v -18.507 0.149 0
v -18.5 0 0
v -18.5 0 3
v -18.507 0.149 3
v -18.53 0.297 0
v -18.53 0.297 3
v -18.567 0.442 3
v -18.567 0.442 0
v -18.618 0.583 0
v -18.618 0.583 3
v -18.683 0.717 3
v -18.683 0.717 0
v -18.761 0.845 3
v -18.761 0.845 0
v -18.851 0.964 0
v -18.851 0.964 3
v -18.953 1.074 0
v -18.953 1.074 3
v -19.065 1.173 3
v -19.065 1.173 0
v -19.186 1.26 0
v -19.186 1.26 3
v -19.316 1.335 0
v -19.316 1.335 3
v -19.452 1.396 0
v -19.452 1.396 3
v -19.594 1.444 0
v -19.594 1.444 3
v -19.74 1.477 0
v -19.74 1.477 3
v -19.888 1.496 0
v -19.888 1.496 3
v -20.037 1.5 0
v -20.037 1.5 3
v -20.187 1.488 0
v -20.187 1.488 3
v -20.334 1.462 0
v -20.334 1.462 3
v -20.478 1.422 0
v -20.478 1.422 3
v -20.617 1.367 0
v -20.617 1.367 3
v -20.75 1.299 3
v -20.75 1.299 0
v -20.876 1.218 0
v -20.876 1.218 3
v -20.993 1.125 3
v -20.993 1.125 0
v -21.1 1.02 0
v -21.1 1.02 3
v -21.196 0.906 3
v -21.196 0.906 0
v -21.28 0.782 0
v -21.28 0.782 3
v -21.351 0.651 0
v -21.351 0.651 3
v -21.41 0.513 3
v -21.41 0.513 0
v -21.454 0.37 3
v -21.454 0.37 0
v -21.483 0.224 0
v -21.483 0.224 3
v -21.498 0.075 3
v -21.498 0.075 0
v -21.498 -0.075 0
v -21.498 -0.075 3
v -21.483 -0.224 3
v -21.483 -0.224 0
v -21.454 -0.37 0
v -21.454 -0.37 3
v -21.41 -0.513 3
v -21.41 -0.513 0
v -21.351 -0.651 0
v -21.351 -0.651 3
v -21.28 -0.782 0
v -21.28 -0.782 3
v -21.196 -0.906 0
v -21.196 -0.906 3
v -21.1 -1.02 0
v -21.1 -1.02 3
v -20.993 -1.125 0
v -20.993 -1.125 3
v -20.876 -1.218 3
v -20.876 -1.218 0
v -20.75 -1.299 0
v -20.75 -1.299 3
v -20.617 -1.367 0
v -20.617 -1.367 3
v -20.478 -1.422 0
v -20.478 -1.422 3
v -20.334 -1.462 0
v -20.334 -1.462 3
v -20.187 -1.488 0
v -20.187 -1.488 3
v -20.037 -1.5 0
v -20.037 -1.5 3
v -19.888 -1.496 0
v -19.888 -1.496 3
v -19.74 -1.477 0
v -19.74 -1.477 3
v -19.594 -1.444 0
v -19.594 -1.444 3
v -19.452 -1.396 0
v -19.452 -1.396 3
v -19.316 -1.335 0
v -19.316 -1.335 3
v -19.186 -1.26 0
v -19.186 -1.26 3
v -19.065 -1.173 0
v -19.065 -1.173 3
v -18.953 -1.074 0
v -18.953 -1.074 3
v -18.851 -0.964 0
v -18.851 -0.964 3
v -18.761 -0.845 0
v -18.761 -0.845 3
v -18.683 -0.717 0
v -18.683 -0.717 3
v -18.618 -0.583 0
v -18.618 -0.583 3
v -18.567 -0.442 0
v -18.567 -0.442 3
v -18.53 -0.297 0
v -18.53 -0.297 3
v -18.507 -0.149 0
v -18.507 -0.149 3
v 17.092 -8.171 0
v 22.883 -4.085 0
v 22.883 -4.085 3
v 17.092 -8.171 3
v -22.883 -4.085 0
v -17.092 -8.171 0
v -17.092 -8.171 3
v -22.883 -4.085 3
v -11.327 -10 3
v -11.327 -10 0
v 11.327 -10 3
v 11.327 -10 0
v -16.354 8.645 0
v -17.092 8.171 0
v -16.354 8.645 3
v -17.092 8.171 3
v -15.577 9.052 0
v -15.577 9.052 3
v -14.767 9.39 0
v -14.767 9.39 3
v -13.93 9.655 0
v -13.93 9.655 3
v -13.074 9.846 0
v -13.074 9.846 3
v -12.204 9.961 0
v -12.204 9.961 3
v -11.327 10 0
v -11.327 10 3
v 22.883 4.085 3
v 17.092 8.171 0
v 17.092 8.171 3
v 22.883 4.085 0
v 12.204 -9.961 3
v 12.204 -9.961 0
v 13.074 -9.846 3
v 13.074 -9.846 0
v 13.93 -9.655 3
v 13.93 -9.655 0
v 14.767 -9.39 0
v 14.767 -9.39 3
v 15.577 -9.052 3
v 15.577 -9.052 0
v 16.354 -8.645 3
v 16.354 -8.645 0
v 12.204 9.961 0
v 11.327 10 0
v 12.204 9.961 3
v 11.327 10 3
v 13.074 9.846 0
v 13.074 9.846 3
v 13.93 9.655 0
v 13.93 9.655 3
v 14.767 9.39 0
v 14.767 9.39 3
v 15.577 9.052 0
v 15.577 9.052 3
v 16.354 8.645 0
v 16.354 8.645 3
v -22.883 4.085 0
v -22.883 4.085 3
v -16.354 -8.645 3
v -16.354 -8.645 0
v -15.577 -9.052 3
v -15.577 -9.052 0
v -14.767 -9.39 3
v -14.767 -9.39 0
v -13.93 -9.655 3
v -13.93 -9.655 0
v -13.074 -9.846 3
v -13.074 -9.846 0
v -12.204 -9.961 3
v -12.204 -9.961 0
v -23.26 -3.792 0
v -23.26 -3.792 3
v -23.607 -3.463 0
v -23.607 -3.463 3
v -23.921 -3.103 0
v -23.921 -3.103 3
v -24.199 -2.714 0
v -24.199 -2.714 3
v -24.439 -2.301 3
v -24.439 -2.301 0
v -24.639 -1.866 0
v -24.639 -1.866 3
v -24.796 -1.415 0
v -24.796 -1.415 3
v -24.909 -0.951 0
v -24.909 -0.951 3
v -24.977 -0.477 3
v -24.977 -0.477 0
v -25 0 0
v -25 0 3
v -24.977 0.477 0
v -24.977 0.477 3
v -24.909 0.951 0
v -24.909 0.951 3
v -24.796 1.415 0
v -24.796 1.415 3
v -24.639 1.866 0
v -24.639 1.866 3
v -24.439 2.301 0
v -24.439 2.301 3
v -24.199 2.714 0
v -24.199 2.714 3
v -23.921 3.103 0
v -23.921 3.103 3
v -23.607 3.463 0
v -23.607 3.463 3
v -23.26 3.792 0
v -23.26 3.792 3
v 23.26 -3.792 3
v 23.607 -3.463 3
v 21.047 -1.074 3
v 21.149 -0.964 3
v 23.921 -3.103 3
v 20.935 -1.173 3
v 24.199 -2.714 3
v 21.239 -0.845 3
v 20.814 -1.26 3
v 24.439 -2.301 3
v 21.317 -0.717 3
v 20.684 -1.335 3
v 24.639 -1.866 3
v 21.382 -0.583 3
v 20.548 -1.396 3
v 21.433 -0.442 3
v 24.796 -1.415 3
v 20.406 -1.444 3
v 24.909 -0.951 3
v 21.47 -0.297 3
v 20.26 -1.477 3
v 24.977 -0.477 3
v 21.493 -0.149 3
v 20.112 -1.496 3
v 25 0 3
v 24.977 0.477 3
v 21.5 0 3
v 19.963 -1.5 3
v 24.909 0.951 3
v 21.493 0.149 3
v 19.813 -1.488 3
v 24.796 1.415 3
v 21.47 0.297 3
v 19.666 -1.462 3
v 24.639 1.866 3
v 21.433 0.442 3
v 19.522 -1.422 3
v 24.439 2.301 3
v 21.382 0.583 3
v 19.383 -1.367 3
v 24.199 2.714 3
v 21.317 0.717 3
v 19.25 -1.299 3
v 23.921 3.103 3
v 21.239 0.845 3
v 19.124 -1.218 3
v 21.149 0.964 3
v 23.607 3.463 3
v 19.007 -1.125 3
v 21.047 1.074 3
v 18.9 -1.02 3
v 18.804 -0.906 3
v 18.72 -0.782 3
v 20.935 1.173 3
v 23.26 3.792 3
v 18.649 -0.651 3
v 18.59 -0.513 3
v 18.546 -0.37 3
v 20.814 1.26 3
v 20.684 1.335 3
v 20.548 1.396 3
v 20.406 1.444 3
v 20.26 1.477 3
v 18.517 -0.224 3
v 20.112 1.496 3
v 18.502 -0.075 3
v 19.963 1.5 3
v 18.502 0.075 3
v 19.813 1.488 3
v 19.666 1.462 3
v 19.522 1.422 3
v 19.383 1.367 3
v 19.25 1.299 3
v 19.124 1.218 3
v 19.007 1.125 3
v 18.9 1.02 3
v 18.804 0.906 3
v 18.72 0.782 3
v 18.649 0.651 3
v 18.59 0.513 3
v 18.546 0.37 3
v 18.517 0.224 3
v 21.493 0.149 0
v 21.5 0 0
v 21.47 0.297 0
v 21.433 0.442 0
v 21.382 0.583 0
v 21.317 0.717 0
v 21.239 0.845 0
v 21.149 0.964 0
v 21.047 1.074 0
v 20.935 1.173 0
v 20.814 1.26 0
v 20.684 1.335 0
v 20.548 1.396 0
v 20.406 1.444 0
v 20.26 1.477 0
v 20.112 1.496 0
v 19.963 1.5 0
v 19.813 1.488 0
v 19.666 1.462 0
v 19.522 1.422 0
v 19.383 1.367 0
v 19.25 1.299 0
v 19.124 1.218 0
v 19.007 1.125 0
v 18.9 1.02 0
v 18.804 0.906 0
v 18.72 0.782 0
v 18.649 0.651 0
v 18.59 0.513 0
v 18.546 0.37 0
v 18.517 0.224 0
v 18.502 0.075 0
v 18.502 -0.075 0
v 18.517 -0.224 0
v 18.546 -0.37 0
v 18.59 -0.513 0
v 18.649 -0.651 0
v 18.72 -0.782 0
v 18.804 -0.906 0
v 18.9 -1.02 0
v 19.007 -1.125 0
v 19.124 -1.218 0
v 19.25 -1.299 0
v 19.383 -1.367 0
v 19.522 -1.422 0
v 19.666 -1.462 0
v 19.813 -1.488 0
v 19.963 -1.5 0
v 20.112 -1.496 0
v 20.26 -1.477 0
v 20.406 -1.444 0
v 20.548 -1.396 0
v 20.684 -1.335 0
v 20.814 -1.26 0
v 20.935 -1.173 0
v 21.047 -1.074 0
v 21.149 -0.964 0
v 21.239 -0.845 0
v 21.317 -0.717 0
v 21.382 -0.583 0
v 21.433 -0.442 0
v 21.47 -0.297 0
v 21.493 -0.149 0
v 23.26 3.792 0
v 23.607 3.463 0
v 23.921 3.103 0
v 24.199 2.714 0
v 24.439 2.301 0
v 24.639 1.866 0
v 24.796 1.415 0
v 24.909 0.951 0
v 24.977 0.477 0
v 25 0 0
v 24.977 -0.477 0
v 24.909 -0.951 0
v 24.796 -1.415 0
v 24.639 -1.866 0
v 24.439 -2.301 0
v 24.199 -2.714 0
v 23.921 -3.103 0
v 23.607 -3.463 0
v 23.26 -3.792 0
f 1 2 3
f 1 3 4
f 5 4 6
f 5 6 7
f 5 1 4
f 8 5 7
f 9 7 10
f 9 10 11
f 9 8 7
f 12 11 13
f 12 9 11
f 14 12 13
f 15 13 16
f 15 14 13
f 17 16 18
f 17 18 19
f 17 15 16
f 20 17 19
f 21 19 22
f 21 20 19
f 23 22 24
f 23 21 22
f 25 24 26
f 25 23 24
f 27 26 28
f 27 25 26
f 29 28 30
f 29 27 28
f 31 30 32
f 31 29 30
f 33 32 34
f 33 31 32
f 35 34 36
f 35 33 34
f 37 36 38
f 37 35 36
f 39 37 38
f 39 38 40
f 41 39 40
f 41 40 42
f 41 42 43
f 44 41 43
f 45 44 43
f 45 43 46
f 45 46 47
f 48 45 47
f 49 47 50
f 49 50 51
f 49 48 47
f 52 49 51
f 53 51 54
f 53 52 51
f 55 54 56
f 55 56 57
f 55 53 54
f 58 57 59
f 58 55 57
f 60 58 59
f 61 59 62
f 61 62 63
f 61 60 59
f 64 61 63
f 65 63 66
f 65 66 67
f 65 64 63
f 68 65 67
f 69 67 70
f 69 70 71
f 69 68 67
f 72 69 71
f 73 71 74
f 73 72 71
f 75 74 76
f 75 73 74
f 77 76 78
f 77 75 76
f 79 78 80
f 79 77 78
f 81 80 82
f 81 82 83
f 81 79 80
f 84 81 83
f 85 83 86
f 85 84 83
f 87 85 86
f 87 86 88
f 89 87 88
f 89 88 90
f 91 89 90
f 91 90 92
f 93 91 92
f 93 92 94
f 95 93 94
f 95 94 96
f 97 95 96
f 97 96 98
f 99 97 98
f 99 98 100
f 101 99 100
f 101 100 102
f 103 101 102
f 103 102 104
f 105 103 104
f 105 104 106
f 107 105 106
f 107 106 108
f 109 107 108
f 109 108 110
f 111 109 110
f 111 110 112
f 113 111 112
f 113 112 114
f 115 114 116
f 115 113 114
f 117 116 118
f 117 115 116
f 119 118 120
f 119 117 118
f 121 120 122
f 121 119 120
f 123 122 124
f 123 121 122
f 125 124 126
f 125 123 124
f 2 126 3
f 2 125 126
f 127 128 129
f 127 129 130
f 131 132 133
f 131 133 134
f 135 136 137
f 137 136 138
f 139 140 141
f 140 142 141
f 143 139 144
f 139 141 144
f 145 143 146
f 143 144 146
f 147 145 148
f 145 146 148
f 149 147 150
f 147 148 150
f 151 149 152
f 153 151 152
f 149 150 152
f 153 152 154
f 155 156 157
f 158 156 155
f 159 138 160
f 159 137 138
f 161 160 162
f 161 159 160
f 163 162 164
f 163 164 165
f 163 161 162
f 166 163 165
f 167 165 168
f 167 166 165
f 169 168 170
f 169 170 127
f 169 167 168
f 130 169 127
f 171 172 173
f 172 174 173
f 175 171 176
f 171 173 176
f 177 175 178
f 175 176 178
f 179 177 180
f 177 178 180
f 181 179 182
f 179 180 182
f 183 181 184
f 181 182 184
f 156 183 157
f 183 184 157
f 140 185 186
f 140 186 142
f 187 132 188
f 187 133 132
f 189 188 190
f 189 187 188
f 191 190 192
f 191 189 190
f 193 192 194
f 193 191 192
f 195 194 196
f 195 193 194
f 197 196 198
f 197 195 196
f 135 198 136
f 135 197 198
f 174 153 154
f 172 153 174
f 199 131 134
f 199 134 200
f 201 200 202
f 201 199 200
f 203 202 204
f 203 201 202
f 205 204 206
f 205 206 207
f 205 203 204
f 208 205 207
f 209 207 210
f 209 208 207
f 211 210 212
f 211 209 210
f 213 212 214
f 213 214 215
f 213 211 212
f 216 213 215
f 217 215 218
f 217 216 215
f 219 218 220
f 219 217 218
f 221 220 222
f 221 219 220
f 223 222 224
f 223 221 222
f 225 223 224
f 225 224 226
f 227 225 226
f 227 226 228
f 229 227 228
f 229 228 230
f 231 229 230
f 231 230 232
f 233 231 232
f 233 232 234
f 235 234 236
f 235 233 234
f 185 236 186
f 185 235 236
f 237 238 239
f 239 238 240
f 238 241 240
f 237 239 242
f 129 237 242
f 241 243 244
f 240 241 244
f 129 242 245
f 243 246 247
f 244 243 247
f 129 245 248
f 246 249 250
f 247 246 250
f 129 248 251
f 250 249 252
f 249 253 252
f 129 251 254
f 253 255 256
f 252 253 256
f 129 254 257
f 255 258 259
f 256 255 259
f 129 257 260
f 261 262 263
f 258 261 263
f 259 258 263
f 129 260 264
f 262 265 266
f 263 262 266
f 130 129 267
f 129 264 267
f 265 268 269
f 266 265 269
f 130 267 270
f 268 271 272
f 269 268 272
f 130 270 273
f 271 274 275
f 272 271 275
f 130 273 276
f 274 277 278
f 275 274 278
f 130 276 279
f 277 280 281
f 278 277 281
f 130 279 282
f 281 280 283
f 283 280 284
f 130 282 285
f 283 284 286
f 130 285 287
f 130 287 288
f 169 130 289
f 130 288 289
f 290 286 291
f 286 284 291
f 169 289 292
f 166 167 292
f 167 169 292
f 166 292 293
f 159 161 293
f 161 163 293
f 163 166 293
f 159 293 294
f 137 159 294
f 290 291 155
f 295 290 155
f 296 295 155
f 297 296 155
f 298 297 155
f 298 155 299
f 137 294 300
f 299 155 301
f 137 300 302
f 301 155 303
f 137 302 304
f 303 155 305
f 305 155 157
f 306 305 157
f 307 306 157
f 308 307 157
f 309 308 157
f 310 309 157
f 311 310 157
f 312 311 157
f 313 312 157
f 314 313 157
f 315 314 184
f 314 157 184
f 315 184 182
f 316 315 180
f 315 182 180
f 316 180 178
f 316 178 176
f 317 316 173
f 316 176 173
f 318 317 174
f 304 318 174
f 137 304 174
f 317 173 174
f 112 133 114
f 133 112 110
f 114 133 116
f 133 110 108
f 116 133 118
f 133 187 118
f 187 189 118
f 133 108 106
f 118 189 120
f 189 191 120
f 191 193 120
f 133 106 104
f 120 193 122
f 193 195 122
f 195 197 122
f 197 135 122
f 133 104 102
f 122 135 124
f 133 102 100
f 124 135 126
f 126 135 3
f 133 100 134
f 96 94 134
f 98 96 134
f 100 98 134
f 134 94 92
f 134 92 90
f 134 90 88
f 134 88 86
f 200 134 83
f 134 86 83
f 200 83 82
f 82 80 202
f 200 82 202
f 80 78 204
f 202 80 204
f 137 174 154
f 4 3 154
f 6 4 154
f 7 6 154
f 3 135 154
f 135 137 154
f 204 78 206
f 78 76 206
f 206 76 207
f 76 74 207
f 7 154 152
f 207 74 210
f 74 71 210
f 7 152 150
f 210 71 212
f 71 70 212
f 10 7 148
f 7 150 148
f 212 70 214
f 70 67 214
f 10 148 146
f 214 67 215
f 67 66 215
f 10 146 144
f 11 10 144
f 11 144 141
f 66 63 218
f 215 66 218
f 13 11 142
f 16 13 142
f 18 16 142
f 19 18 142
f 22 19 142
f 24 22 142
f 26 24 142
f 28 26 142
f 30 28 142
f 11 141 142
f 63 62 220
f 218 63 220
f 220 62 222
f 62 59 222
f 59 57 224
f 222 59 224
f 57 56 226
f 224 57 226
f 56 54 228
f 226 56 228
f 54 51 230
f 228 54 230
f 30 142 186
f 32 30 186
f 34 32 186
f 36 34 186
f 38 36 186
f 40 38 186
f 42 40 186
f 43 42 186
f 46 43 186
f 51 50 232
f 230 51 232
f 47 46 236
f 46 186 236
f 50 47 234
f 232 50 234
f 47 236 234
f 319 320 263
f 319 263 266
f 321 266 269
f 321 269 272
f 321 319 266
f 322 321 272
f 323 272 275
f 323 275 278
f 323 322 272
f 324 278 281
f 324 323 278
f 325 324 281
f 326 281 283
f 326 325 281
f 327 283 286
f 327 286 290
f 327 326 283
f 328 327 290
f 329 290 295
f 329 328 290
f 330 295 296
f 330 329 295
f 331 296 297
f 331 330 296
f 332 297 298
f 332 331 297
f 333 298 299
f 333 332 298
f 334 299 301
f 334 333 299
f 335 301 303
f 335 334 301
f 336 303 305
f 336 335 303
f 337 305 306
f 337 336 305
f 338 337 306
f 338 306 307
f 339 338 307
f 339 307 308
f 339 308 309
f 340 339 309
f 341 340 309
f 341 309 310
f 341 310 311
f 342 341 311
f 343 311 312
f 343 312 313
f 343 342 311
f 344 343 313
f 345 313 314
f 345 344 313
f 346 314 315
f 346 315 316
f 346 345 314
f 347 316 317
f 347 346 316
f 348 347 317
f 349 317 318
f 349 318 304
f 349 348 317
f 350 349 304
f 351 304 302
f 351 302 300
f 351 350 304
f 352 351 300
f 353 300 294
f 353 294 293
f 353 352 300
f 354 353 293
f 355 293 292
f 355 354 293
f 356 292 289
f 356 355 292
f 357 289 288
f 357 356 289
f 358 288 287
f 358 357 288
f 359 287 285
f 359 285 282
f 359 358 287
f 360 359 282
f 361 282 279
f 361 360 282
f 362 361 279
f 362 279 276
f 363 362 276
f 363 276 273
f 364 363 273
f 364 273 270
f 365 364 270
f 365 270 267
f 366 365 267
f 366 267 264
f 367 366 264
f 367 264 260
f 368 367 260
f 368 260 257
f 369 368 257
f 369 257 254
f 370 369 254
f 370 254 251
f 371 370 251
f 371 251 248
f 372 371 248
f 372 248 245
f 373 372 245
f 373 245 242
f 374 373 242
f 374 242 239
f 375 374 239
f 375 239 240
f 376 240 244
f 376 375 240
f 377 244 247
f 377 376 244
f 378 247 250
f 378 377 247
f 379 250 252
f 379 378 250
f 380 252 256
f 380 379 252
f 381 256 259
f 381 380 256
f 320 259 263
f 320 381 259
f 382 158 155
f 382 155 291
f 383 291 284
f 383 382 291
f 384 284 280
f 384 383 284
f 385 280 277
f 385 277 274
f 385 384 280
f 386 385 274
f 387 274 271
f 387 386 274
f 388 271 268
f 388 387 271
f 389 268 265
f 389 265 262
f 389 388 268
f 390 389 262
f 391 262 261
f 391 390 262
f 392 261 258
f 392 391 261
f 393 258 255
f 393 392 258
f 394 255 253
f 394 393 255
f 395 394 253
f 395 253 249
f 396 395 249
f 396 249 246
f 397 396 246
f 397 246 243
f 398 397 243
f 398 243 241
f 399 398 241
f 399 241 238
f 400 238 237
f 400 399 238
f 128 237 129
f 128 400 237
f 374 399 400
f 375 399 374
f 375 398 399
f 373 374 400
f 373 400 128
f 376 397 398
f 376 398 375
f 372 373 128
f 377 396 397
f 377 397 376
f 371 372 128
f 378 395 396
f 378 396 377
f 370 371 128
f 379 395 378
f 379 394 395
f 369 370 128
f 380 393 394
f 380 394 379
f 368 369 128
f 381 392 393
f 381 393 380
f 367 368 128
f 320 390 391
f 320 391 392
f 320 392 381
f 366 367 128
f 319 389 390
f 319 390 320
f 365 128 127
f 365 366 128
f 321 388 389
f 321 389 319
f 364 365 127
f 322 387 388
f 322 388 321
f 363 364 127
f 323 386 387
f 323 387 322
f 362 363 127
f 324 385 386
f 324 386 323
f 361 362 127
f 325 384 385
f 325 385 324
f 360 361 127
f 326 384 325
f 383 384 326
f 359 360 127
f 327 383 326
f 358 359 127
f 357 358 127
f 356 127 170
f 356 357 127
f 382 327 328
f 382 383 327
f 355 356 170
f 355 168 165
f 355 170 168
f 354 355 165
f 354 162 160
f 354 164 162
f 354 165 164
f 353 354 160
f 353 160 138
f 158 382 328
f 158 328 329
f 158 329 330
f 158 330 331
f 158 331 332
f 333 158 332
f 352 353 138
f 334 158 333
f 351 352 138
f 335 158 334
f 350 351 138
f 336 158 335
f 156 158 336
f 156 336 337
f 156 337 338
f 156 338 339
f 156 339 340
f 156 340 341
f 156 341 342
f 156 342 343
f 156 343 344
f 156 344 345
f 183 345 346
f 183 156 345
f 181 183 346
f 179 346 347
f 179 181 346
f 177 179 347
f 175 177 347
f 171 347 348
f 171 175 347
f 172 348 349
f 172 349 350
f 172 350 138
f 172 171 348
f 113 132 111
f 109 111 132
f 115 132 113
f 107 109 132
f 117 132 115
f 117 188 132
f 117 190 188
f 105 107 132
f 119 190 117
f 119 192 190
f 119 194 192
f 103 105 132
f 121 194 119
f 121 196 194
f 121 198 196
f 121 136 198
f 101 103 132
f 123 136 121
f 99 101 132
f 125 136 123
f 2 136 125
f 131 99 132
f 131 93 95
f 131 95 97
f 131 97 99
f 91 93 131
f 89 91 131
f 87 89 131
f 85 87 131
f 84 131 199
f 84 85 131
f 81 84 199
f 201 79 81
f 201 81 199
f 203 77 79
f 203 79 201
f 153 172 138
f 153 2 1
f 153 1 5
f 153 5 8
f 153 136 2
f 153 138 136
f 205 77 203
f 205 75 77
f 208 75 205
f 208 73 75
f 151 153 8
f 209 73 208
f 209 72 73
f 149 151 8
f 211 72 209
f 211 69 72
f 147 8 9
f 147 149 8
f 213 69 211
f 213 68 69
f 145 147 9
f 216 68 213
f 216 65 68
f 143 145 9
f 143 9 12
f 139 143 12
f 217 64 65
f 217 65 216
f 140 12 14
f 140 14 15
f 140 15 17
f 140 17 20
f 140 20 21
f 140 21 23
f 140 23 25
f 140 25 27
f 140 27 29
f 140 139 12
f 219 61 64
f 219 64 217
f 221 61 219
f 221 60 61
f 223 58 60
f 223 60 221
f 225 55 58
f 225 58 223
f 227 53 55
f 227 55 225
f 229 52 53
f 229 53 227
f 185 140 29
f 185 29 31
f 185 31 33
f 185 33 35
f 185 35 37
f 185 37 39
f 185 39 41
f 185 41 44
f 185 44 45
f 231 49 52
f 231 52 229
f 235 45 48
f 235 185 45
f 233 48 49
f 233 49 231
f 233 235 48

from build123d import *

# Parameters (mm, degrees)
ESBO_O1_R                = 1.5
ESBO_O1_W                = 29
ESBO_O1_H                = 20
RESSALTO_EXTRUS_O1_DEPTH = 3
FILETE1_R                = 10


with BuildPart() as part:
    # Esboço1 → Ressalto-extrusão1 (new body)
    with BuildSketch(Plane.XY):
        with BuildLine():
            Line((-22.882588201, 4.085423511), (-14.5, 10))
            Line((-14.5, 10), (-14.5, -10))
            Line((-14.5, -10), (-22.882588201, -4.085423511))
            ThreePointArc((-22.882588201, -4.085423511), (-25, 0), (-22.882588201, 4.085423511))
        make_face()
        with Locations((-20, 0)):
            Circle(ESBO_O1_R, mode=Mode.SUBTRACT)
        Rectangle(ESBO_O1_W, ESBO_O1_H)
        with BuildLine():
            ThreePointArc((22.882588201, 4.085423511), (25, 0), (22.882588201, -4.085423511))
            Line((22.882588201, -4.085423511), (14.5, -10))
            Line((14.5, -10), (14.5, 10))
            Line((14.5, 10), (22.882588201, 4.085423511))
        make_face()
        with Locations((20, 0)):
            Circle(ESBO_O1_R, mode=Mode.SUBTRACT)
    extrude(amount=RESSALTO_EXTRUS_O1_DEPTH)

    # Filete1
    filete1_edges = [part.edges().sort_by_distance(p)[0] for p in [
        (-14.5, 10, 1.5),
        (14.5, 10, 1.5),
        (14.5, -10, 1.5),
        (-14.5, -10, 1.5),
    ]]
    fillet(filete1_edges, radius=FILETE1_R)


solid = part.part
